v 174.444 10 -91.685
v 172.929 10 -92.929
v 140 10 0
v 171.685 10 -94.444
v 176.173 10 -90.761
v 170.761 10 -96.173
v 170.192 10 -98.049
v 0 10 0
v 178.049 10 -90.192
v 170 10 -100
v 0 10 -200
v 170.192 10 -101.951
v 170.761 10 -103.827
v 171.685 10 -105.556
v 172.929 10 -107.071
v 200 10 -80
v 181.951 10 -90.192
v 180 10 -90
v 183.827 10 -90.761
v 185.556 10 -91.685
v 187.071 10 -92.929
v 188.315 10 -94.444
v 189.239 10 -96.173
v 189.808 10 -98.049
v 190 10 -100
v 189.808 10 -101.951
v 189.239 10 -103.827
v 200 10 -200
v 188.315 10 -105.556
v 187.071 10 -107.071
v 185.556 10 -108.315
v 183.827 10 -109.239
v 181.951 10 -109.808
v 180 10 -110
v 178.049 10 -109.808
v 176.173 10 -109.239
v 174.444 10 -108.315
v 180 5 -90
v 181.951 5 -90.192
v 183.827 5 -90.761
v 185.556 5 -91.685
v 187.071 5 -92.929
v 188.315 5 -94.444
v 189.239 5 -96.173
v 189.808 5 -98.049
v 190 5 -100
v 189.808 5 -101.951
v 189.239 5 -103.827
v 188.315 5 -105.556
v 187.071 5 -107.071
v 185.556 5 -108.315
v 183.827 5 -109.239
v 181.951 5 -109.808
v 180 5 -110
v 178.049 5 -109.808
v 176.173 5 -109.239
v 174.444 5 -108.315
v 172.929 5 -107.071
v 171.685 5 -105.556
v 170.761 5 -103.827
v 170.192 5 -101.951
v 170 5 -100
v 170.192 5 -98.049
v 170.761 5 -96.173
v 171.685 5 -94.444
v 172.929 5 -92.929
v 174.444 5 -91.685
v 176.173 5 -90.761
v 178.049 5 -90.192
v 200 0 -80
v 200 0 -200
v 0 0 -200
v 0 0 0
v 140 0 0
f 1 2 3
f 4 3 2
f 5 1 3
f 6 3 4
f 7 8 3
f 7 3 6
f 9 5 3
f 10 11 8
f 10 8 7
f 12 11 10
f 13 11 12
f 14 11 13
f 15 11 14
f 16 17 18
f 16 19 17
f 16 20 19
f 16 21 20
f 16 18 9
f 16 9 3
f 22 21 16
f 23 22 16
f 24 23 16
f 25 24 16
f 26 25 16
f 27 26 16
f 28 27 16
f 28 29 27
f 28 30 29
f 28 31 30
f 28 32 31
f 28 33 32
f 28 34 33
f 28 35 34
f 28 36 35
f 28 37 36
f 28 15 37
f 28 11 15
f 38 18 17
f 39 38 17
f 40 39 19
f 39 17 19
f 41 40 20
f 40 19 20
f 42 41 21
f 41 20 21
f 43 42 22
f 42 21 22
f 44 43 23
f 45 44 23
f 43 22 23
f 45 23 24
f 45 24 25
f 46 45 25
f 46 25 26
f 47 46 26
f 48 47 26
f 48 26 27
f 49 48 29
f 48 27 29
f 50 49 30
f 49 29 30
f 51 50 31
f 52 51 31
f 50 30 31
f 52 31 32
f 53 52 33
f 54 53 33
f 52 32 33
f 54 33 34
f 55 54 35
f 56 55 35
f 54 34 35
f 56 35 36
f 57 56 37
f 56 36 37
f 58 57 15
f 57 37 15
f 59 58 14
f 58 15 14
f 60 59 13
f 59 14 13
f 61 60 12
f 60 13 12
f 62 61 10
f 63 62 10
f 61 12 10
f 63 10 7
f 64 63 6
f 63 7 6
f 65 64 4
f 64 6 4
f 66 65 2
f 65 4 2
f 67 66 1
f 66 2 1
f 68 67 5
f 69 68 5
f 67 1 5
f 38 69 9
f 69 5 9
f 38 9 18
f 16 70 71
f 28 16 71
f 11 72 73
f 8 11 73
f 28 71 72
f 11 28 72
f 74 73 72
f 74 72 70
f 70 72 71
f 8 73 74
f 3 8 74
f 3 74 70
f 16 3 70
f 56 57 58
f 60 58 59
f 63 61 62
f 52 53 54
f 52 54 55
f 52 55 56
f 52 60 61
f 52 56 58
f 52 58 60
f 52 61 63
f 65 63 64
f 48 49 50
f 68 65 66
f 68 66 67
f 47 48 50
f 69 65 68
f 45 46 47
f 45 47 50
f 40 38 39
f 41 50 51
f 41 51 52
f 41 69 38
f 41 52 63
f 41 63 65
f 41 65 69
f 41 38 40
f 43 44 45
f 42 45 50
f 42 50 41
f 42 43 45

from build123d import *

# Parameters (mm, degrees)
EXTRUDE_1_DEPTH     = 10
SKETCH_2_R          = 10
CUT_EXTRUDE_1_DEPTH = 5


with BuildPart() as part:
    # Эскиз1 → Бобышка-Вытянуть1 (new body)
    with BuildSketch(Plane(origin=(0, 0, 0), x_dir=(1, 0, 0), z_dir=(0, 1, 0))):
        Polygon((0, 0), (140, 0), (200, 80), (200, 120), (200, 200), (140, 200), (0, 200), align=None)
    extrude(amount=EXTRUDE_1_DEPTH)

    # Эскиз2 → Вырез-Вытянуть1 (cut)
    with BuildSketch(Plane(origin=(0, 10, 0), x_dir=(1, 0, 0), z_dir=(0, 1, 0))):
        with Locations(Location((180, 100, 0), (0, 0, 270))):
            Circle(SKETCH_2_R)
    extrude(amount=-CUT_EXTRUDE_1_DEPTH, mode=Mode.SUBTRACT)


solid = part.part
